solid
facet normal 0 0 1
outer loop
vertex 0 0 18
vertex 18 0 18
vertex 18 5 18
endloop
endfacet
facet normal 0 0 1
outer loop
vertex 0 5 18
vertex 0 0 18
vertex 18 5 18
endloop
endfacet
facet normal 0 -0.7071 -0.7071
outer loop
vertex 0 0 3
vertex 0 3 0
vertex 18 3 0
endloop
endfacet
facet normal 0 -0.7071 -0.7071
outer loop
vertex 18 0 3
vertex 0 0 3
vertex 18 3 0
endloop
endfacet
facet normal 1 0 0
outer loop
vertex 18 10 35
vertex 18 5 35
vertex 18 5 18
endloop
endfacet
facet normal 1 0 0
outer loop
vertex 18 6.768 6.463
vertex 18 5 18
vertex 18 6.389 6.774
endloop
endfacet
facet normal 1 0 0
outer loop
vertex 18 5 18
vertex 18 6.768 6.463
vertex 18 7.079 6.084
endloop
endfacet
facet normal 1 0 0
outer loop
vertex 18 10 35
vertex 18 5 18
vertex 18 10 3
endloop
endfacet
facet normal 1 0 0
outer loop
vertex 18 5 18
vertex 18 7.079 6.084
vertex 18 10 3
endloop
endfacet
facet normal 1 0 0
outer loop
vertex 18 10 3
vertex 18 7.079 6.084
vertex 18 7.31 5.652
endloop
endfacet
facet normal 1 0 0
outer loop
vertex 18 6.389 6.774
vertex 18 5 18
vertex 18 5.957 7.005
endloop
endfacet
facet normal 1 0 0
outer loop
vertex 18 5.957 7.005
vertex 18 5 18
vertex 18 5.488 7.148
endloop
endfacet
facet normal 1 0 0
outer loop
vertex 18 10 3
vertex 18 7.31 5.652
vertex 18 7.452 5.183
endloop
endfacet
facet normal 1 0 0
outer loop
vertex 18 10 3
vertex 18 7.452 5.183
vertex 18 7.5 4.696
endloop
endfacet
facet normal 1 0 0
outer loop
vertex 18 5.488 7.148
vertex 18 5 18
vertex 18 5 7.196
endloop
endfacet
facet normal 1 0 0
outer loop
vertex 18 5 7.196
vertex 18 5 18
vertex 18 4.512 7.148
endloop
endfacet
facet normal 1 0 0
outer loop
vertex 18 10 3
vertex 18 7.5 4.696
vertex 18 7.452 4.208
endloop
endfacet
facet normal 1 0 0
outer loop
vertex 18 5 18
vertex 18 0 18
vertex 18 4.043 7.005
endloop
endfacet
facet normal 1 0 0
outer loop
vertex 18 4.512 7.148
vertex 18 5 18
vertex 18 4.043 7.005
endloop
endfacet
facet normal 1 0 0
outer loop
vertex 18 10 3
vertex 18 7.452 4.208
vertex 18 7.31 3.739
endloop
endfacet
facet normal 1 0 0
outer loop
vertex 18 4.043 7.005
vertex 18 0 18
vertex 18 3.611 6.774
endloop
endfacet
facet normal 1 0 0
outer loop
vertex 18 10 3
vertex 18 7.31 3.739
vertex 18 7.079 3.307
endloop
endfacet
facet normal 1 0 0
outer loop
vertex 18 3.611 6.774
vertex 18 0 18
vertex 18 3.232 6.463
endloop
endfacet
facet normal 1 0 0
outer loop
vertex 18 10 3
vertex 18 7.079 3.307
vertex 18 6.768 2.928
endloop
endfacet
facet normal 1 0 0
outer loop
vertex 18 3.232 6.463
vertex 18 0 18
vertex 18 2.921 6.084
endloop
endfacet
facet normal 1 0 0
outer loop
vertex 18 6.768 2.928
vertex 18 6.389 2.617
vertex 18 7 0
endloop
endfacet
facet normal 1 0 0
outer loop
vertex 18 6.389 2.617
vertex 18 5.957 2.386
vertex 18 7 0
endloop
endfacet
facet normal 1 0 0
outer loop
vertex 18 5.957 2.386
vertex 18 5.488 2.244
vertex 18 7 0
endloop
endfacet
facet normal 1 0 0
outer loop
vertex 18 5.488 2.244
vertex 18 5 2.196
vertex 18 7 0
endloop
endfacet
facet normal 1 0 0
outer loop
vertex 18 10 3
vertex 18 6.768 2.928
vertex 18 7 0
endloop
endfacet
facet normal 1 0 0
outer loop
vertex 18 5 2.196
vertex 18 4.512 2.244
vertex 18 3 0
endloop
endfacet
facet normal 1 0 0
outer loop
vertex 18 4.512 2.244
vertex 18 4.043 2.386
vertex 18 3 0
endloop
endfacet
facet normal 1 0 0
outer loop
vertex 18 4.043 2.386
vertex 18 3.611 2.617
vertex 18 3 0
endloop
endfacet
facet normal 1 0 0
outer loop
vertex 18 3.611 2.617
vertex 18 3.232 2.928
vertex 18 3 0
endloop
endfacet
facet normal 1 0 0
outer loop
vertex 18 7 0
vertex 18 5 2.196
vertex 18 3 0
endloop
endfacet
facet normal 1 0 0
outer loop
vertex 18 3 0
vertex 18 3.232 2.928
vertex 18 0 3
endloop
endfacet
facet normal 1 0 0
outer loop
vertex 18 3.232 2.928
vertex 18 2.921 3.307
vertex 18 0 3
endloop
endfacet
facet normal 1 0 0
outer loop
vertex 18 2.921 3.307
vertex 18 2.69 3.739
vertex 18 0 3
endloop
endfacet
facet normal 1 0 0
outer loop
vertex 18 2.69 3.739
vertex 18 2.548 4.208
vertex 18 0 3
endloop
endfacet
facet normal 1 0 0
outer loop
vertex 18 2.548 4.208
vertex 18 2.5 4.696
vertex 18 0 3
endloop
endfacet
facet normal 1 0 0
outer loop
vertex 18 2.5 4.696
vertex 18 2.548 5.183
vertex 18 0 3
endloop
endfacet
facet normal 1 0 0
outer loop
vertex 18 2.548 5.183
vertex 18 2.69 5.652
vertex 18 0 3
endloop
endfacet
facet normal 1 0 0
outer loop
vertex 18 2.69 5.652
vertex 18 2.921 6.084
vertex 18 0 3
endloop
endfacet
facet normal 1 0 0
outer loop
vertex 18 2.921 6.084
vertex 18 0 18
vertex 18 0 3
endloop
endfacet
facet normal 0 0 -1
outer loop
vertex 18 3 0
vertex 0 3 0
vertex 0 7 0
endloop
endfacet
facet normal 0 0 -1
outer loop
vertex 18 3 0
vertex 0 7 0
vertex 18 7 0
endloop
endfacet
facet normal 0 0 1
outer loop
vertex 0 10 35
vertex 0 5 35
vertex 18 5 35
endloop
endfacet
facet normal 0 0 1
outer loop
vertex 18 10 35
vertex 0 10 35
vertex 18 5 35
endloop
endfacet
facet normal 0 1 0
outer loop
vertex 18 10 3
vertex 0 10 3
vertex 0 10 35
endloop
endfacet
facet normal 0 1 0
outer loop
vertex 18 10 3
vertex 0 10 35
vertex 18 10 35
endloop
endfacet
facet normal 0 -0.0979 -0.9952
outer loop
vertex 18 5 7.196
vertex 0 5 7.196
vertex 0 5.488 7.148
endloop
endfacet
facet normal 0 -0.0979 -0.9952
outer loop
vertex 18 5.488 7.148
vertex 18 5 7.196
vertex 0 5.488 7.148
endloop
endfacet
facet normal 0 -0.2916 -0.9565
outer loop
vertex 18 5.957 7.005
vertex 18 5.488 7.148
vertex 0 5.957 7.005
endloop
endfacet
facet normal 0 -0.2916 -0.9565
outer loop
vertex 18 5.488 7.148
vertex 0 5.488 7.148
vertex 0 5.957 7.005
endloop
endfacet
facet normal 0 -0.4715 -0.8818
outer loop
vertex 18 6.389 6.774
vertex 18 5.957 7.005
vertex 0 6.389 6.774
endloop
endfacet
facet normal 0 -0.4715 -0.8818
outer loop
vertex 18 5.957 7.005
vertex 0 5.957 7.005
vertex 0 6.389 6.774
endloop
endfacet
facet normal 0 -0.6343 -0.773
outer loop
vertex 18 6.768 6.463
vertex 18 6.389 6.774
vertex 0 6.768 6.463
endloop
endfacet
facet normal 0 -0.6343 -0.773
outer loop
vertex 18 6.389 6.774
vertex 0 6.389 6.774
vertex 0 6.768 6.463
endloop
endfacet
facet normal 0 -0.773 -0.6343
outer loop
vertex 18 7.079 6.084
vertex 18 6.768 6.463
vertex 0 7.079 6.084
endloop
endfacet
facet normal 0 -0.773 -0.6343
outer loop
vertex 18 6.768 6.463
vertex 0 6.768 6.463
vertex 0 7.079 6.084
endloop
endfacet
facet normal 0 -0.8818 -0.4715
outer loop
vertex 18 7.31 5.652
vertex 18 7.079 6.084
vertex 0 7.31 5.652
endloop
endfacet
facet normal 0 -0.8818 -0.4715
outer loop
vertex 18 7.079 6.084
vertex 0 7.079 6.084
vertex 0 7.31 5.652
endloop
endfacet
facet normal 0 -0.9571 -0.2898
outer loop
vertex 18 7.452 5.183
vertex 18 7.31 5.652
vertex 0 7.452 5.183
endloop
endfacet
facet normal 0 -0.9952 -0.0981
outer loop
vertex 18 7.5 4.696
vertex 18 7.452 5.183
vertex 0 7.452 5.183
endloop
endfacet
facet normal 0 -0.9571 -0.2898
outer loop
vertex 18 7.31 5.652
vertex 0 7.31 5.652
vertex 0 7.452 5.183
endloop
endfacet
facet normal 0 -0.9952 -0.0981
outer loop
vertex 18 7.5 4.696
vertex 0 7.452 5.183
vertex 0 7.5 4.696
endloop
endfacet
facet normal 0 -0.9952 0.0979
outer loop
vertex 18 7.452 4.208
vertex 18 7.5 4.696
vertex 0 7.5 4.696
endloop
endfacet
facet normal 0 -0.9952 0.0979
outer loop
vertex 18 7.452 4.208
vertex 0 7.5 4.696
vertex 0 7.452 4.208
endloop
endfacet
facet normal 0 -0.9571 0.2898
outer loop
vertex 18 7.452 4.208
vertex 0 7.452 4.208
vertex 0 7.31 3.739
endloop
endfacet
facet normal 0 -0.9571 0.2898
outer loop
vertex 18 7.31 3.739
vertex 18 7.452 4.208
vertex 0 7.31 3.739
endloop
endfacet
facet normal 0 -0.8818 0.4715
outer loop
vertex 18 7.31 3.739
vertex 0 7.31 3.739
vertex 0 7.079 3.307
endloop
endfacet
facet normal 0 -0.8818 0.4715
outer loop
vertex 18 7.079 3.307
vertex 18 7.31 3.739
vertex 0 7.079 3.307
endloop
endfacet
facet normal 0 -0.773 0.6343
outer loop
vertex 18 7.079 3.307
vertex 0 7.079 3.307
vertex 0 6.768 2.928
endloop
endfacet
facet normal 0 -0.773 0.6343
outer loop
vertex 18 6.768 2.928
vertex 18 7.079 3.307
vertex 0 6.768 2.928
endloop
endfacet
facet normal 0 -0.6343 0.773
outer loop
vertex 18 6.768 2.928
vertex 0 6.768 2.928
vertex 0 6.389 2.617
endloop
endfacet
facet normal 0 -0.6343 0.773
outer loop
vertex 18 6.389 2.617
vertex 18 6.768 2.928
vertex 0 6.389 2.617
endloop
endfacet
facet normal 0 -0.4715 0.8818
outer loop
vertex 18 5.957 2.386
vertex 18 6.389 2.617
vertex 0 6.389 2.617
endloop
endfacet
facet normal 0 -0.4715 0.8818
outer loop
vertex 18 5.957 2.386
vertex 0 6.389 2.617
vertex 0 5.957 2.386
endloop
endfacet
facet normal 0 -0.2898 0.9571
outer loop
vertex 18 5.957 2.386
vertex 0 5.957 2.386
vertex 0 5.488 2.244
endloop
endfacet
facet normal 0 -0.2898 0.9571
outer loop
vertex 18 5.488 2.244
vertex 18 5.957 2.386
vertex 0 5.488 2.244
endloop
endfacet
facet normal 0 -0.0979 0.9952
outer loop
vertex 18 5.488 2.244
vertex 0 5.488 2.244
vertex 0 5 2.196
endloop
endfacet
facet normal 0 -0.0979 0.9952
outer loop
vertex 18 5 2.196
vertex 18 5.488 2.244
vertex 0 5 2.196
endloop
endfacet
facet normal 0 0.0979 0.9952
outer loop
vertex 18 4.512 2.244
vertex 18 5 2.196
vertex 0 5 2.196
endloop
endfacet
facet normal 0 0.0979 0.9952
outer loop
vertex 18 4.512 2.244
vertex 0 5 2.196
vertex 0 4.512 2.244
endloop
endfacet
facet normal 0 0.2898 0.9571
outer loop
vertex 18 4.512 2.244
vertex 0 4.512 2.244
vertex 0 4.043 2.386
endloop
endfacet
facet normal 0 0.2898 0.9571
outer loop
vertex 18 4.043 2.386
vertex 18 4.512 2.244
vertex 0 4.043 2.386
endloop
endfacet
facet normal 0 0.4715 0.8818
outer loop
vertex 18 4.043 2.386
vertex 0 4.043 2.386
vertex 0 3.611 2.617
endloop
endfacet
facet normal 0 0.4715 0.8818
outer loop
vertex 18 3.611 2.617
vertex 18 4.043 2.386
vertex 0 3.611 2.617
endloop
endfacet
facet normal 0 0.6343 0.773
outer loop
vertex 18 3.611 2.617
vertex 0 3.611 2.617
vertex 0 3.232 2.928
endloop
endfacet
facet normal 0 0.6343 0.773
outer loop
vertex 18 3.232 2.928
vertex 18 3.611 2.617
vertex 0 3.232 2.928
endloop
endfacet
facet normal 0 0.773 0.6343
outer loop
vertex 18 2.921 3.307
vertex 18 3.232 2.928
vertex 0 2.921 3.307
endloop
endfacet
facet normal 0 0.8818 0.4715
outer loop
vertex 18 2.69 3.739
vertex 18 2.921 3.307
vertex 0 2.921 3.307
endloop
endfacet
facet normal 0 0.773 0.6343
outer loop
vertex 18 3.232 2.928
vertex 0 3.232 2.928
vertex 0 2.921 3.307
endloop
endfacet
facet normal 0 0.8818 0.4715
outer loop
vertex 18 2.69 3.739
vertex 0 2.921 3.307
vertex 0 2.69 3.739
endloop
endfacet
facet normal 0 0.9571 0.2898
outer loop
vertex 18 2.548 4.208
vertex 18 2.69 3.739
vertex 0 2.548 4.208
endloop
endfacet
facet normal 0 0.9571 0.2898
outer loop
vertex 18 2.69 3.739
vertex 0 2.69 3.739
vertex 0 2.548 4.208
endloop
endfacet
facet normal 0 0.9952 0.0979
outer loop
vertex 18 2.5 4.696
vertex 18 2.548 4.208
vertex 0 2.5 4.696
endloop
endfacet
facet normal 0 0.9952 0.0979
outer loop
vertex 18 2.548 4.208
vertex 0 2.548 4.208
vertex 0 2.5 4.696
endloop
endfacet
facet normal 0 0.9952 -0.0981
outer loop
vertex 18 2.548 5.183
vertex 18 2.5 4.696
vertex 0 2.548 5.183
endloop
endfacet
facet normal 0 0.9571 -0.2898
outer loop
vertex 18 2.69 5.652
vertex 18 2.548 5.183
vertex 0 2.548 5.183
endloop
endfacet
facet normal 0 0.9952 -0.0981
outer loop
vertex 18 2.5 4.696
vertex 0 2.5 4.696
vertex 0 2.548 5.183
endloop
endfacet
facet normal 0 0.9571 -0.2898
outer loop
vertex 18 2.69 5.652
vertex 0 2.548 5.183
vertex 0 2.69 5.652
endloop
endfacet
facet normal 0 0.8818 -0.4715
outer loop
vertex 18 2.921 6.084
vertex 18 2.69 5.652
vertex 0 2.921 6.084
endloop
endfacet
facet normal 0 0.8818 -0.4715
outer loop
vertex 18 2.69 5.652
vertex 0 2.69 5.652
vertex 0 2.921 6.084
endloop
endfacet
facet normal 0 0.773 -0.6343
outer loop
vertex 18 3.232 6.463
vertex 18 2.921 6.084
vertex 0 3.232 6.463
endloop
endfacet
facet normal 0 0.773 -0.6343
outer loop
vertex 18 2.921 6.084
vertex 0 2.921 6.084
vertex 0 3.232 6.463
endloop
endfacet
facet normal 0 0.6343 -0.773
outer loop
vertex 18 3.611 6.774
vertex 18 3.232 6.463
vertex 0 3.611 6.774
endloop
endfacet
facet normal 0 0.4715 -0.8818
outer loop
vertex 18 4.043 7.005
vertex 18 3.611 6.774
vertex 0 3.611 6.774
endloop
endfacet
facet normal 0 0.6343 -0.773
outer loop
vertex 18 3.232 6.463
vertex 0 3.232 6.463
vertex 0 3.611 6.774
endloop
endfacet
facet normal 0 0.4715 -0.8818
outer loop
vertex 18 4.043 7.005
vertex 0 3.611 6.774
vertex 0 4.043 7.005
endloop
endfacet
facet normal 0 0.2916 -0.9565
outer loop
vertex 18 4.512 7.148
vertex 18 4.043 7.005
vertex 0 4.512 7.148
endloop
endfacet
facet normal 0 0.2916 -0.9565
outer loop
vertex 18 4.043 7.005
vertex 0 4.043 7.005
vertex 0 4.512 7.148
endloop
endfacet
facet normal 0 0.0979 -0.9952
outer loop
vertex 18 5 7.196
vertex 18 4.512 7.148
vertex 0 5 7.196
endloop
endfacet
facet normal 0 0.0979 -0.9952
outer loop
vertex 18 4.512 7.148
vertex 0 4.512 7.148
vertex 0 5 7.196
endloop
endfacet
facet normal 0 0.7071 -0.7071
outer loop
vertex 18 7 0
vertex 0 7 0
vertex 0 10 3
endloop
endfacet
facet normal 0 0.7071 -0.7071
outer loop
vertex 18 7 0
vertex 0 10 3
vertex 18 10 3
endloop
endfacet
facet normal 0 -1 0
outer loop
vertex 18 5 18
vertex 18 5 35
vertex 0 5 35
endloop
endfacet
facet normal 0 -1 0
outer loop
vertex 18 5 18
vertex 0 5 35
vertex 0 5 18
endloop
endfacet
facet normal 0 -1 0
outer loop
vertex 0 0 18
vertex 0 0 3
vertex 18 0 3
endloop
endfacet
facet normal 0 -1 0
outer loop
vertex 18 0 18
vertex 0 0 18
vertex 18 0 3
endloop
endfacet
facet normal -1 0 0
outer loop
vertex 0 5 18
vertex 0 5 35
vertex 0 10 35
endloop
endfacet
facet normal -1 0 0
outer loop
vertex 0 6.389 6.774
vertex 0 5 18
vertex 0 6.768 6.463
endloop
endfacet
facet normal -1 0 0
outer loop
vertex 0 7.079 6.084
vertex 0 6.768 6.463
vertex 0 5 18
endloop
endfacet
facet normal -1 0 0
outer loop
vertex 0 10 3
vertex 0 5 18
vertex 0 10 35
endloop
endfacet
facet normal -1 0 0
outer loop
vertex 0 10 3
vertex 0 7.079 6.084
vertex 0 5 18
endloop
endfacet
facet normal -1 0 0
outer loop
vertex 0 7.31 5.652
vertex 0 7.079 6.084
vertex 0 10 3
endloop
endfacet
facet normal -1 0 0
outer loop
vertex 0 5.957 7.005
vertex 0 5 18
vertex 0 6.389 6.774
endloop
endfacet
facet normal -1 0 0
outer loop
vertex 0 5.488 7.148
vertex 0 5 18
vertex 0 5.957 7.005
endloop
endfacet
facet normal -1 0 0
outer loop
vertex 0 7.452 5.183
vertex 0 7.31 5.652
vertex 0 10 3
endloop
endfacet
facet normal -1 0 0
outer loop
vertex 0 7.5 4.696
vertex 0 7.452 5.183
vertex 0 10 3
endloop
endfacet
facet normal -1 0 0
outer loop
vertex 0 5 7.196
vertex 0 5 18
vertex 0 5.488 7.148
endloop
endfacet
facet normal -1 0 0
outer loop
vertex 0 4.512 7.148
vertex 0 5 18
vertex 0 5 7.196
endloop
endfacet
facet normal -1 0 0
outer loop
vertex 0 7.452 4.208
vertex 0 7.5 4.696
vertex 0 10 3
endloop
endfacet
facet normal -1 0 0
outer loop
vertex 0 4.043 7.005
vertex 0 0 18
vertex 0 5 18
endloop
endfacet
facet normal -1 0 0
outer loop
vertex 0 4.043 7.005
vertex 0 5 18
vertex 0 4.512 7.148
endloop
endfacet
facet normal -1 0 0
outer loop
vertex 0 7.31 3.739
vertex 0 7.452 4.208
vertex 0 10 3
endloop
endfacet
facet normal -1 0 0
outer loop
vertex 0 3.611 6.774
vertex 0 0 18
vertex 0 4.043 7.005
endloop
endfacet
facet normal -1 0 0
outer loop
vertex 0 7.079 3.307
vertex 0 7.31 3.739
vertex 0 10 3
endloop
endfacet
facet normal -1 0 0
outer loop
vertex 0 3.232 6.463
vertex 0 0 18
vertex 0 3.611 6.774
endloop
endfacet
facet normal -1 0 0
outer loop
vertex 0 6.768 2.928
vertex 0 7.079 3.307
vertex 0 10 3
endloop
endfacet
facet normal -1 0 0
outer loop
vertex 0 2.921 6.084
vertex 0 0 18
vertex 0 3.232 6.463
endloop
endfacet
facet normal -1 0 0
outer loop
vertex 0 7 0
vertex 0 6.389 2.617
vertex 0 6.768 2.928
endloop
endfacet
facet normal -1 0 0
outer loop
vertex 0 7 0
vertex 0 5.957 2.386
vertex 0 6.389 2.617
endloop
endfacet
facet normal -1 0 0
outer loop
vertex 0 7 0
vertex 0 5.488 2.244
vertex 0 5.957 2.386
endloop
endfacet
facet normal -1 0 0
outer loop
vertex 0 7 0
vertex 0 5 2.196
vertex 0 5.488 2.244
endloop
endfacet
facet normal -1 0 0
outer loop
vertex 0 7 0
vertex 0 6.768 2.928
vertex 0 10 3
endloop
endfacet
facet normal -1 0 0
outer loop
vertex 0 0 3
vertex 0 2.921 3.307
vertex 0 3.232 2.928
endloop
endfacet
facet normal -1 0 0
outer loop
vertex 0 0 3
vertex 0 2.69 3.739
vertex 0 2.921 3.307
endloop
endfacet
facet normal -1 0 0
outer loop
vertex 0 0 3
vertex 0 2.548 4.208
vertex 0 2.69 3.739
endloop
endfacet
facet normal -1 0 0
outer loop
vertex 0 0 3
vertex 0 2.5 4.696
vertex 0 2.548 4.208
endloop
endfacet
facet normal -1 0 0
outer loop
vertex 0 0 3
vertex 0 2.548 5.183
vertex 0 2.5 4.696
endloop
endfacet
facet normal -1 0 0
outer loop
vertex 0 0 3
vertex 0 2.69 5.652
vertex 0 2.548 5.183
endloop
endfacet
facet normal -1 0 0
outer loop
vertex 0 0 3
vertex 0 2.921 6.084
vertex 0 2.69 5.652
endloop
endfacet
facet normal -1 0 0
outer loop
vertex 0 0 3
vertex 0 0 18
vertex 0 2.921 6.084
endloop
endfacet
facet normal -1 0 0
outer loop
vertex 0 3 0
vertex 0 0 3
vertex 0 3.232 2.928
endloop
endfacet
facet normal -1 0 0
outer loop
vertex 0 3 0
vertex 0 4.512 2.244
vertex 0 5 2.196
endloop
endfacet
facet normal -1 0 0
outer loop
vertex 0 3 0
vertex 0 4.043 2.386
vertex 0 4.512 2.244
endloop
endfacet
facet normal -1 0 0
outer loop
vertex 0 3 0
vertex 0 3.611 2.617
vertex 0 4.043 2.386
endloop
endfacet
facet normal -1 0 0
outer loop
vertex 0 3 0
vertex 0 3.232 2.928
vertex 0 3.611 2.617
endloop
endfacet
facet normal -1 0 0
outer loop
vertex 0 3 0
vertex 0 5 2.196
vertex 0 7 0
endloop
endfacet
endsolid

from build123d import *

# Parameters (mm, degrees)
SKETCH_1_W          = 18
SKETCH_1_H          = 35
EXTRUDE_1_DEPTH     = 10
SKETCH_2_W          = 17
SKETCH_2_H          = 5
CUT_EXTRUDE_2_DEPTH = 41.607881008
SKETCH_3_R          = 2.5
CUT_EXTRUDE_1_DEPTH = 41.607881008
CHAMFER_1_SIZE      = 3


with BuildPart() as part:
    # Эскиз1 → Вытянуть1 (new body)
    with BuildSketch(Plane(origin=(0, 0, 0), x_dir=(1, 0, 0), z_dir=(0, 1, 0))):
        with Locations((9, -17.5)):
            Rectangle(SKETCH_1_W, SKETCH_1_H)
    extrude(amount=EXTRUDE_1_DEPTH)

    # Эскиз2 → Вытянуть2 (cut, through all)
    with BuildSketch(Plane(origin=(18, 0, 0), x_dir=(0, 0, -1), z_dir=(1, 0, 0))):
        with Locations((-26.5, 2.5)):
            Rectangle(SKETCH_2_W, SKETCH_2_H)
    extrude(amount=-CUT_EXTRUDE_2_DEPTH, mode=Mode.SUBTRACT)

    # Эскиз3 → Вырез-Вытянуть1 (cut, through all)
    with BuildSketch(Plane.ZY):
        with Locations((4.695559751, 5)):
            Circle(SKETCH_3_R)
    extrude(amount=-CUT_EXTRUDE_1_DEPTH, mode=Mode.SUBTRACT)

    # Фаска1
    chamfer_1_edges = [part.edges().sort_by_distance(p)[0] for p in [
        (9, 10, 0),
        (9, 0, 0),
    ]]
    chamfer(chamfer_1_edges, length=CHAMFER_1_SIZE)


solid = part.part
